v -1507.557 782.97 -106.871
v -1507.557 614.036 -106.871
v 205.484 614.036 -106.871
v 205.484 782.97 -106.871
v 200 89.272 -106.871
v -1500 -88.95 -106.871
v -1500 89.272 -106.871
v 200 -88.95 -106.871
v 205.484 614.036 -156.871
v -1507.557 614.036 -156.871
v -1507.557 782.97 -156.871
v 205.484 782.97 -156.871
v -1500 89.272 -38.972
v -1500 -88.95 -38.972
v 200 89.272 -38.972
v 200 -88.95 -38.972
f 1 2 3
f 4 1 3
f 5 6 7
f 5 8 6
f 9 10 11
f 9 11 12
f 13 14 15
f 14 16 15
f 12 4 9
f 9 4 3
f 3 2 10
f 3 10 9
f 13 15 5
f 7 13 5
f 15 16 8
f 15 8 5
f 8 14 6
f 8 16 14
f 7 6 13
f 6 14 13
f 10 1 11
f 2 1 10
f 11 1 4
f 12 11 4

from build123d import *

# Parameters (mm, degrees)
F0_W     = 178.2217472792
F0_H     = 17.8985670209
F1_DEPTH = 200
F2_DEPTH = 50
F3_DEPTH = 1500
F4_W     = 1713.0418419838
F4_H     = 168.9335107803
F5_DEPTH = 50


with BuildPart() as f1:
    # F0 (on Right) → F1 (new body)
    with BuildSketch(Plane.YZ):
        with Locations((0.1606494188, -47.9213707149)):
            Rectangle(F0_W, F0_H)
    extrude(amount=F1_DEPTH)

    # F2 (add): a face of the model
    f2_faces = [f1.faces().sort_by_distance(p)[0] for p in [
        (100, 0.1606494188, -56.8706542253),
    ]]
    extrude(f2_faces, amount=F2_DEPTH)

    # F3 (add): a face of the model
    f3_faces = [f1.faces().sort_by_distance(p)[0] for p in [
        (0, 0.1606494188, -72.9213707149),
    ]]
    extrude(f3_faces, amount=F3_DEPTH)


with BuildPart() as f5:
    # F4 (on face) → F5 (new body)
    with BuildSketch(Plane(origin=(0, 0, -106.8706542253), x_dir=(1, 0, 0), z_dir=(0, 0, -1))):
        with Locations((-651.0364711285, -698.5028386116)):
            Rectangle(F4_W, F4_H)
    extrude(amount=F5_DEPTH)


solid = Compound([f1.part, f5.part])
